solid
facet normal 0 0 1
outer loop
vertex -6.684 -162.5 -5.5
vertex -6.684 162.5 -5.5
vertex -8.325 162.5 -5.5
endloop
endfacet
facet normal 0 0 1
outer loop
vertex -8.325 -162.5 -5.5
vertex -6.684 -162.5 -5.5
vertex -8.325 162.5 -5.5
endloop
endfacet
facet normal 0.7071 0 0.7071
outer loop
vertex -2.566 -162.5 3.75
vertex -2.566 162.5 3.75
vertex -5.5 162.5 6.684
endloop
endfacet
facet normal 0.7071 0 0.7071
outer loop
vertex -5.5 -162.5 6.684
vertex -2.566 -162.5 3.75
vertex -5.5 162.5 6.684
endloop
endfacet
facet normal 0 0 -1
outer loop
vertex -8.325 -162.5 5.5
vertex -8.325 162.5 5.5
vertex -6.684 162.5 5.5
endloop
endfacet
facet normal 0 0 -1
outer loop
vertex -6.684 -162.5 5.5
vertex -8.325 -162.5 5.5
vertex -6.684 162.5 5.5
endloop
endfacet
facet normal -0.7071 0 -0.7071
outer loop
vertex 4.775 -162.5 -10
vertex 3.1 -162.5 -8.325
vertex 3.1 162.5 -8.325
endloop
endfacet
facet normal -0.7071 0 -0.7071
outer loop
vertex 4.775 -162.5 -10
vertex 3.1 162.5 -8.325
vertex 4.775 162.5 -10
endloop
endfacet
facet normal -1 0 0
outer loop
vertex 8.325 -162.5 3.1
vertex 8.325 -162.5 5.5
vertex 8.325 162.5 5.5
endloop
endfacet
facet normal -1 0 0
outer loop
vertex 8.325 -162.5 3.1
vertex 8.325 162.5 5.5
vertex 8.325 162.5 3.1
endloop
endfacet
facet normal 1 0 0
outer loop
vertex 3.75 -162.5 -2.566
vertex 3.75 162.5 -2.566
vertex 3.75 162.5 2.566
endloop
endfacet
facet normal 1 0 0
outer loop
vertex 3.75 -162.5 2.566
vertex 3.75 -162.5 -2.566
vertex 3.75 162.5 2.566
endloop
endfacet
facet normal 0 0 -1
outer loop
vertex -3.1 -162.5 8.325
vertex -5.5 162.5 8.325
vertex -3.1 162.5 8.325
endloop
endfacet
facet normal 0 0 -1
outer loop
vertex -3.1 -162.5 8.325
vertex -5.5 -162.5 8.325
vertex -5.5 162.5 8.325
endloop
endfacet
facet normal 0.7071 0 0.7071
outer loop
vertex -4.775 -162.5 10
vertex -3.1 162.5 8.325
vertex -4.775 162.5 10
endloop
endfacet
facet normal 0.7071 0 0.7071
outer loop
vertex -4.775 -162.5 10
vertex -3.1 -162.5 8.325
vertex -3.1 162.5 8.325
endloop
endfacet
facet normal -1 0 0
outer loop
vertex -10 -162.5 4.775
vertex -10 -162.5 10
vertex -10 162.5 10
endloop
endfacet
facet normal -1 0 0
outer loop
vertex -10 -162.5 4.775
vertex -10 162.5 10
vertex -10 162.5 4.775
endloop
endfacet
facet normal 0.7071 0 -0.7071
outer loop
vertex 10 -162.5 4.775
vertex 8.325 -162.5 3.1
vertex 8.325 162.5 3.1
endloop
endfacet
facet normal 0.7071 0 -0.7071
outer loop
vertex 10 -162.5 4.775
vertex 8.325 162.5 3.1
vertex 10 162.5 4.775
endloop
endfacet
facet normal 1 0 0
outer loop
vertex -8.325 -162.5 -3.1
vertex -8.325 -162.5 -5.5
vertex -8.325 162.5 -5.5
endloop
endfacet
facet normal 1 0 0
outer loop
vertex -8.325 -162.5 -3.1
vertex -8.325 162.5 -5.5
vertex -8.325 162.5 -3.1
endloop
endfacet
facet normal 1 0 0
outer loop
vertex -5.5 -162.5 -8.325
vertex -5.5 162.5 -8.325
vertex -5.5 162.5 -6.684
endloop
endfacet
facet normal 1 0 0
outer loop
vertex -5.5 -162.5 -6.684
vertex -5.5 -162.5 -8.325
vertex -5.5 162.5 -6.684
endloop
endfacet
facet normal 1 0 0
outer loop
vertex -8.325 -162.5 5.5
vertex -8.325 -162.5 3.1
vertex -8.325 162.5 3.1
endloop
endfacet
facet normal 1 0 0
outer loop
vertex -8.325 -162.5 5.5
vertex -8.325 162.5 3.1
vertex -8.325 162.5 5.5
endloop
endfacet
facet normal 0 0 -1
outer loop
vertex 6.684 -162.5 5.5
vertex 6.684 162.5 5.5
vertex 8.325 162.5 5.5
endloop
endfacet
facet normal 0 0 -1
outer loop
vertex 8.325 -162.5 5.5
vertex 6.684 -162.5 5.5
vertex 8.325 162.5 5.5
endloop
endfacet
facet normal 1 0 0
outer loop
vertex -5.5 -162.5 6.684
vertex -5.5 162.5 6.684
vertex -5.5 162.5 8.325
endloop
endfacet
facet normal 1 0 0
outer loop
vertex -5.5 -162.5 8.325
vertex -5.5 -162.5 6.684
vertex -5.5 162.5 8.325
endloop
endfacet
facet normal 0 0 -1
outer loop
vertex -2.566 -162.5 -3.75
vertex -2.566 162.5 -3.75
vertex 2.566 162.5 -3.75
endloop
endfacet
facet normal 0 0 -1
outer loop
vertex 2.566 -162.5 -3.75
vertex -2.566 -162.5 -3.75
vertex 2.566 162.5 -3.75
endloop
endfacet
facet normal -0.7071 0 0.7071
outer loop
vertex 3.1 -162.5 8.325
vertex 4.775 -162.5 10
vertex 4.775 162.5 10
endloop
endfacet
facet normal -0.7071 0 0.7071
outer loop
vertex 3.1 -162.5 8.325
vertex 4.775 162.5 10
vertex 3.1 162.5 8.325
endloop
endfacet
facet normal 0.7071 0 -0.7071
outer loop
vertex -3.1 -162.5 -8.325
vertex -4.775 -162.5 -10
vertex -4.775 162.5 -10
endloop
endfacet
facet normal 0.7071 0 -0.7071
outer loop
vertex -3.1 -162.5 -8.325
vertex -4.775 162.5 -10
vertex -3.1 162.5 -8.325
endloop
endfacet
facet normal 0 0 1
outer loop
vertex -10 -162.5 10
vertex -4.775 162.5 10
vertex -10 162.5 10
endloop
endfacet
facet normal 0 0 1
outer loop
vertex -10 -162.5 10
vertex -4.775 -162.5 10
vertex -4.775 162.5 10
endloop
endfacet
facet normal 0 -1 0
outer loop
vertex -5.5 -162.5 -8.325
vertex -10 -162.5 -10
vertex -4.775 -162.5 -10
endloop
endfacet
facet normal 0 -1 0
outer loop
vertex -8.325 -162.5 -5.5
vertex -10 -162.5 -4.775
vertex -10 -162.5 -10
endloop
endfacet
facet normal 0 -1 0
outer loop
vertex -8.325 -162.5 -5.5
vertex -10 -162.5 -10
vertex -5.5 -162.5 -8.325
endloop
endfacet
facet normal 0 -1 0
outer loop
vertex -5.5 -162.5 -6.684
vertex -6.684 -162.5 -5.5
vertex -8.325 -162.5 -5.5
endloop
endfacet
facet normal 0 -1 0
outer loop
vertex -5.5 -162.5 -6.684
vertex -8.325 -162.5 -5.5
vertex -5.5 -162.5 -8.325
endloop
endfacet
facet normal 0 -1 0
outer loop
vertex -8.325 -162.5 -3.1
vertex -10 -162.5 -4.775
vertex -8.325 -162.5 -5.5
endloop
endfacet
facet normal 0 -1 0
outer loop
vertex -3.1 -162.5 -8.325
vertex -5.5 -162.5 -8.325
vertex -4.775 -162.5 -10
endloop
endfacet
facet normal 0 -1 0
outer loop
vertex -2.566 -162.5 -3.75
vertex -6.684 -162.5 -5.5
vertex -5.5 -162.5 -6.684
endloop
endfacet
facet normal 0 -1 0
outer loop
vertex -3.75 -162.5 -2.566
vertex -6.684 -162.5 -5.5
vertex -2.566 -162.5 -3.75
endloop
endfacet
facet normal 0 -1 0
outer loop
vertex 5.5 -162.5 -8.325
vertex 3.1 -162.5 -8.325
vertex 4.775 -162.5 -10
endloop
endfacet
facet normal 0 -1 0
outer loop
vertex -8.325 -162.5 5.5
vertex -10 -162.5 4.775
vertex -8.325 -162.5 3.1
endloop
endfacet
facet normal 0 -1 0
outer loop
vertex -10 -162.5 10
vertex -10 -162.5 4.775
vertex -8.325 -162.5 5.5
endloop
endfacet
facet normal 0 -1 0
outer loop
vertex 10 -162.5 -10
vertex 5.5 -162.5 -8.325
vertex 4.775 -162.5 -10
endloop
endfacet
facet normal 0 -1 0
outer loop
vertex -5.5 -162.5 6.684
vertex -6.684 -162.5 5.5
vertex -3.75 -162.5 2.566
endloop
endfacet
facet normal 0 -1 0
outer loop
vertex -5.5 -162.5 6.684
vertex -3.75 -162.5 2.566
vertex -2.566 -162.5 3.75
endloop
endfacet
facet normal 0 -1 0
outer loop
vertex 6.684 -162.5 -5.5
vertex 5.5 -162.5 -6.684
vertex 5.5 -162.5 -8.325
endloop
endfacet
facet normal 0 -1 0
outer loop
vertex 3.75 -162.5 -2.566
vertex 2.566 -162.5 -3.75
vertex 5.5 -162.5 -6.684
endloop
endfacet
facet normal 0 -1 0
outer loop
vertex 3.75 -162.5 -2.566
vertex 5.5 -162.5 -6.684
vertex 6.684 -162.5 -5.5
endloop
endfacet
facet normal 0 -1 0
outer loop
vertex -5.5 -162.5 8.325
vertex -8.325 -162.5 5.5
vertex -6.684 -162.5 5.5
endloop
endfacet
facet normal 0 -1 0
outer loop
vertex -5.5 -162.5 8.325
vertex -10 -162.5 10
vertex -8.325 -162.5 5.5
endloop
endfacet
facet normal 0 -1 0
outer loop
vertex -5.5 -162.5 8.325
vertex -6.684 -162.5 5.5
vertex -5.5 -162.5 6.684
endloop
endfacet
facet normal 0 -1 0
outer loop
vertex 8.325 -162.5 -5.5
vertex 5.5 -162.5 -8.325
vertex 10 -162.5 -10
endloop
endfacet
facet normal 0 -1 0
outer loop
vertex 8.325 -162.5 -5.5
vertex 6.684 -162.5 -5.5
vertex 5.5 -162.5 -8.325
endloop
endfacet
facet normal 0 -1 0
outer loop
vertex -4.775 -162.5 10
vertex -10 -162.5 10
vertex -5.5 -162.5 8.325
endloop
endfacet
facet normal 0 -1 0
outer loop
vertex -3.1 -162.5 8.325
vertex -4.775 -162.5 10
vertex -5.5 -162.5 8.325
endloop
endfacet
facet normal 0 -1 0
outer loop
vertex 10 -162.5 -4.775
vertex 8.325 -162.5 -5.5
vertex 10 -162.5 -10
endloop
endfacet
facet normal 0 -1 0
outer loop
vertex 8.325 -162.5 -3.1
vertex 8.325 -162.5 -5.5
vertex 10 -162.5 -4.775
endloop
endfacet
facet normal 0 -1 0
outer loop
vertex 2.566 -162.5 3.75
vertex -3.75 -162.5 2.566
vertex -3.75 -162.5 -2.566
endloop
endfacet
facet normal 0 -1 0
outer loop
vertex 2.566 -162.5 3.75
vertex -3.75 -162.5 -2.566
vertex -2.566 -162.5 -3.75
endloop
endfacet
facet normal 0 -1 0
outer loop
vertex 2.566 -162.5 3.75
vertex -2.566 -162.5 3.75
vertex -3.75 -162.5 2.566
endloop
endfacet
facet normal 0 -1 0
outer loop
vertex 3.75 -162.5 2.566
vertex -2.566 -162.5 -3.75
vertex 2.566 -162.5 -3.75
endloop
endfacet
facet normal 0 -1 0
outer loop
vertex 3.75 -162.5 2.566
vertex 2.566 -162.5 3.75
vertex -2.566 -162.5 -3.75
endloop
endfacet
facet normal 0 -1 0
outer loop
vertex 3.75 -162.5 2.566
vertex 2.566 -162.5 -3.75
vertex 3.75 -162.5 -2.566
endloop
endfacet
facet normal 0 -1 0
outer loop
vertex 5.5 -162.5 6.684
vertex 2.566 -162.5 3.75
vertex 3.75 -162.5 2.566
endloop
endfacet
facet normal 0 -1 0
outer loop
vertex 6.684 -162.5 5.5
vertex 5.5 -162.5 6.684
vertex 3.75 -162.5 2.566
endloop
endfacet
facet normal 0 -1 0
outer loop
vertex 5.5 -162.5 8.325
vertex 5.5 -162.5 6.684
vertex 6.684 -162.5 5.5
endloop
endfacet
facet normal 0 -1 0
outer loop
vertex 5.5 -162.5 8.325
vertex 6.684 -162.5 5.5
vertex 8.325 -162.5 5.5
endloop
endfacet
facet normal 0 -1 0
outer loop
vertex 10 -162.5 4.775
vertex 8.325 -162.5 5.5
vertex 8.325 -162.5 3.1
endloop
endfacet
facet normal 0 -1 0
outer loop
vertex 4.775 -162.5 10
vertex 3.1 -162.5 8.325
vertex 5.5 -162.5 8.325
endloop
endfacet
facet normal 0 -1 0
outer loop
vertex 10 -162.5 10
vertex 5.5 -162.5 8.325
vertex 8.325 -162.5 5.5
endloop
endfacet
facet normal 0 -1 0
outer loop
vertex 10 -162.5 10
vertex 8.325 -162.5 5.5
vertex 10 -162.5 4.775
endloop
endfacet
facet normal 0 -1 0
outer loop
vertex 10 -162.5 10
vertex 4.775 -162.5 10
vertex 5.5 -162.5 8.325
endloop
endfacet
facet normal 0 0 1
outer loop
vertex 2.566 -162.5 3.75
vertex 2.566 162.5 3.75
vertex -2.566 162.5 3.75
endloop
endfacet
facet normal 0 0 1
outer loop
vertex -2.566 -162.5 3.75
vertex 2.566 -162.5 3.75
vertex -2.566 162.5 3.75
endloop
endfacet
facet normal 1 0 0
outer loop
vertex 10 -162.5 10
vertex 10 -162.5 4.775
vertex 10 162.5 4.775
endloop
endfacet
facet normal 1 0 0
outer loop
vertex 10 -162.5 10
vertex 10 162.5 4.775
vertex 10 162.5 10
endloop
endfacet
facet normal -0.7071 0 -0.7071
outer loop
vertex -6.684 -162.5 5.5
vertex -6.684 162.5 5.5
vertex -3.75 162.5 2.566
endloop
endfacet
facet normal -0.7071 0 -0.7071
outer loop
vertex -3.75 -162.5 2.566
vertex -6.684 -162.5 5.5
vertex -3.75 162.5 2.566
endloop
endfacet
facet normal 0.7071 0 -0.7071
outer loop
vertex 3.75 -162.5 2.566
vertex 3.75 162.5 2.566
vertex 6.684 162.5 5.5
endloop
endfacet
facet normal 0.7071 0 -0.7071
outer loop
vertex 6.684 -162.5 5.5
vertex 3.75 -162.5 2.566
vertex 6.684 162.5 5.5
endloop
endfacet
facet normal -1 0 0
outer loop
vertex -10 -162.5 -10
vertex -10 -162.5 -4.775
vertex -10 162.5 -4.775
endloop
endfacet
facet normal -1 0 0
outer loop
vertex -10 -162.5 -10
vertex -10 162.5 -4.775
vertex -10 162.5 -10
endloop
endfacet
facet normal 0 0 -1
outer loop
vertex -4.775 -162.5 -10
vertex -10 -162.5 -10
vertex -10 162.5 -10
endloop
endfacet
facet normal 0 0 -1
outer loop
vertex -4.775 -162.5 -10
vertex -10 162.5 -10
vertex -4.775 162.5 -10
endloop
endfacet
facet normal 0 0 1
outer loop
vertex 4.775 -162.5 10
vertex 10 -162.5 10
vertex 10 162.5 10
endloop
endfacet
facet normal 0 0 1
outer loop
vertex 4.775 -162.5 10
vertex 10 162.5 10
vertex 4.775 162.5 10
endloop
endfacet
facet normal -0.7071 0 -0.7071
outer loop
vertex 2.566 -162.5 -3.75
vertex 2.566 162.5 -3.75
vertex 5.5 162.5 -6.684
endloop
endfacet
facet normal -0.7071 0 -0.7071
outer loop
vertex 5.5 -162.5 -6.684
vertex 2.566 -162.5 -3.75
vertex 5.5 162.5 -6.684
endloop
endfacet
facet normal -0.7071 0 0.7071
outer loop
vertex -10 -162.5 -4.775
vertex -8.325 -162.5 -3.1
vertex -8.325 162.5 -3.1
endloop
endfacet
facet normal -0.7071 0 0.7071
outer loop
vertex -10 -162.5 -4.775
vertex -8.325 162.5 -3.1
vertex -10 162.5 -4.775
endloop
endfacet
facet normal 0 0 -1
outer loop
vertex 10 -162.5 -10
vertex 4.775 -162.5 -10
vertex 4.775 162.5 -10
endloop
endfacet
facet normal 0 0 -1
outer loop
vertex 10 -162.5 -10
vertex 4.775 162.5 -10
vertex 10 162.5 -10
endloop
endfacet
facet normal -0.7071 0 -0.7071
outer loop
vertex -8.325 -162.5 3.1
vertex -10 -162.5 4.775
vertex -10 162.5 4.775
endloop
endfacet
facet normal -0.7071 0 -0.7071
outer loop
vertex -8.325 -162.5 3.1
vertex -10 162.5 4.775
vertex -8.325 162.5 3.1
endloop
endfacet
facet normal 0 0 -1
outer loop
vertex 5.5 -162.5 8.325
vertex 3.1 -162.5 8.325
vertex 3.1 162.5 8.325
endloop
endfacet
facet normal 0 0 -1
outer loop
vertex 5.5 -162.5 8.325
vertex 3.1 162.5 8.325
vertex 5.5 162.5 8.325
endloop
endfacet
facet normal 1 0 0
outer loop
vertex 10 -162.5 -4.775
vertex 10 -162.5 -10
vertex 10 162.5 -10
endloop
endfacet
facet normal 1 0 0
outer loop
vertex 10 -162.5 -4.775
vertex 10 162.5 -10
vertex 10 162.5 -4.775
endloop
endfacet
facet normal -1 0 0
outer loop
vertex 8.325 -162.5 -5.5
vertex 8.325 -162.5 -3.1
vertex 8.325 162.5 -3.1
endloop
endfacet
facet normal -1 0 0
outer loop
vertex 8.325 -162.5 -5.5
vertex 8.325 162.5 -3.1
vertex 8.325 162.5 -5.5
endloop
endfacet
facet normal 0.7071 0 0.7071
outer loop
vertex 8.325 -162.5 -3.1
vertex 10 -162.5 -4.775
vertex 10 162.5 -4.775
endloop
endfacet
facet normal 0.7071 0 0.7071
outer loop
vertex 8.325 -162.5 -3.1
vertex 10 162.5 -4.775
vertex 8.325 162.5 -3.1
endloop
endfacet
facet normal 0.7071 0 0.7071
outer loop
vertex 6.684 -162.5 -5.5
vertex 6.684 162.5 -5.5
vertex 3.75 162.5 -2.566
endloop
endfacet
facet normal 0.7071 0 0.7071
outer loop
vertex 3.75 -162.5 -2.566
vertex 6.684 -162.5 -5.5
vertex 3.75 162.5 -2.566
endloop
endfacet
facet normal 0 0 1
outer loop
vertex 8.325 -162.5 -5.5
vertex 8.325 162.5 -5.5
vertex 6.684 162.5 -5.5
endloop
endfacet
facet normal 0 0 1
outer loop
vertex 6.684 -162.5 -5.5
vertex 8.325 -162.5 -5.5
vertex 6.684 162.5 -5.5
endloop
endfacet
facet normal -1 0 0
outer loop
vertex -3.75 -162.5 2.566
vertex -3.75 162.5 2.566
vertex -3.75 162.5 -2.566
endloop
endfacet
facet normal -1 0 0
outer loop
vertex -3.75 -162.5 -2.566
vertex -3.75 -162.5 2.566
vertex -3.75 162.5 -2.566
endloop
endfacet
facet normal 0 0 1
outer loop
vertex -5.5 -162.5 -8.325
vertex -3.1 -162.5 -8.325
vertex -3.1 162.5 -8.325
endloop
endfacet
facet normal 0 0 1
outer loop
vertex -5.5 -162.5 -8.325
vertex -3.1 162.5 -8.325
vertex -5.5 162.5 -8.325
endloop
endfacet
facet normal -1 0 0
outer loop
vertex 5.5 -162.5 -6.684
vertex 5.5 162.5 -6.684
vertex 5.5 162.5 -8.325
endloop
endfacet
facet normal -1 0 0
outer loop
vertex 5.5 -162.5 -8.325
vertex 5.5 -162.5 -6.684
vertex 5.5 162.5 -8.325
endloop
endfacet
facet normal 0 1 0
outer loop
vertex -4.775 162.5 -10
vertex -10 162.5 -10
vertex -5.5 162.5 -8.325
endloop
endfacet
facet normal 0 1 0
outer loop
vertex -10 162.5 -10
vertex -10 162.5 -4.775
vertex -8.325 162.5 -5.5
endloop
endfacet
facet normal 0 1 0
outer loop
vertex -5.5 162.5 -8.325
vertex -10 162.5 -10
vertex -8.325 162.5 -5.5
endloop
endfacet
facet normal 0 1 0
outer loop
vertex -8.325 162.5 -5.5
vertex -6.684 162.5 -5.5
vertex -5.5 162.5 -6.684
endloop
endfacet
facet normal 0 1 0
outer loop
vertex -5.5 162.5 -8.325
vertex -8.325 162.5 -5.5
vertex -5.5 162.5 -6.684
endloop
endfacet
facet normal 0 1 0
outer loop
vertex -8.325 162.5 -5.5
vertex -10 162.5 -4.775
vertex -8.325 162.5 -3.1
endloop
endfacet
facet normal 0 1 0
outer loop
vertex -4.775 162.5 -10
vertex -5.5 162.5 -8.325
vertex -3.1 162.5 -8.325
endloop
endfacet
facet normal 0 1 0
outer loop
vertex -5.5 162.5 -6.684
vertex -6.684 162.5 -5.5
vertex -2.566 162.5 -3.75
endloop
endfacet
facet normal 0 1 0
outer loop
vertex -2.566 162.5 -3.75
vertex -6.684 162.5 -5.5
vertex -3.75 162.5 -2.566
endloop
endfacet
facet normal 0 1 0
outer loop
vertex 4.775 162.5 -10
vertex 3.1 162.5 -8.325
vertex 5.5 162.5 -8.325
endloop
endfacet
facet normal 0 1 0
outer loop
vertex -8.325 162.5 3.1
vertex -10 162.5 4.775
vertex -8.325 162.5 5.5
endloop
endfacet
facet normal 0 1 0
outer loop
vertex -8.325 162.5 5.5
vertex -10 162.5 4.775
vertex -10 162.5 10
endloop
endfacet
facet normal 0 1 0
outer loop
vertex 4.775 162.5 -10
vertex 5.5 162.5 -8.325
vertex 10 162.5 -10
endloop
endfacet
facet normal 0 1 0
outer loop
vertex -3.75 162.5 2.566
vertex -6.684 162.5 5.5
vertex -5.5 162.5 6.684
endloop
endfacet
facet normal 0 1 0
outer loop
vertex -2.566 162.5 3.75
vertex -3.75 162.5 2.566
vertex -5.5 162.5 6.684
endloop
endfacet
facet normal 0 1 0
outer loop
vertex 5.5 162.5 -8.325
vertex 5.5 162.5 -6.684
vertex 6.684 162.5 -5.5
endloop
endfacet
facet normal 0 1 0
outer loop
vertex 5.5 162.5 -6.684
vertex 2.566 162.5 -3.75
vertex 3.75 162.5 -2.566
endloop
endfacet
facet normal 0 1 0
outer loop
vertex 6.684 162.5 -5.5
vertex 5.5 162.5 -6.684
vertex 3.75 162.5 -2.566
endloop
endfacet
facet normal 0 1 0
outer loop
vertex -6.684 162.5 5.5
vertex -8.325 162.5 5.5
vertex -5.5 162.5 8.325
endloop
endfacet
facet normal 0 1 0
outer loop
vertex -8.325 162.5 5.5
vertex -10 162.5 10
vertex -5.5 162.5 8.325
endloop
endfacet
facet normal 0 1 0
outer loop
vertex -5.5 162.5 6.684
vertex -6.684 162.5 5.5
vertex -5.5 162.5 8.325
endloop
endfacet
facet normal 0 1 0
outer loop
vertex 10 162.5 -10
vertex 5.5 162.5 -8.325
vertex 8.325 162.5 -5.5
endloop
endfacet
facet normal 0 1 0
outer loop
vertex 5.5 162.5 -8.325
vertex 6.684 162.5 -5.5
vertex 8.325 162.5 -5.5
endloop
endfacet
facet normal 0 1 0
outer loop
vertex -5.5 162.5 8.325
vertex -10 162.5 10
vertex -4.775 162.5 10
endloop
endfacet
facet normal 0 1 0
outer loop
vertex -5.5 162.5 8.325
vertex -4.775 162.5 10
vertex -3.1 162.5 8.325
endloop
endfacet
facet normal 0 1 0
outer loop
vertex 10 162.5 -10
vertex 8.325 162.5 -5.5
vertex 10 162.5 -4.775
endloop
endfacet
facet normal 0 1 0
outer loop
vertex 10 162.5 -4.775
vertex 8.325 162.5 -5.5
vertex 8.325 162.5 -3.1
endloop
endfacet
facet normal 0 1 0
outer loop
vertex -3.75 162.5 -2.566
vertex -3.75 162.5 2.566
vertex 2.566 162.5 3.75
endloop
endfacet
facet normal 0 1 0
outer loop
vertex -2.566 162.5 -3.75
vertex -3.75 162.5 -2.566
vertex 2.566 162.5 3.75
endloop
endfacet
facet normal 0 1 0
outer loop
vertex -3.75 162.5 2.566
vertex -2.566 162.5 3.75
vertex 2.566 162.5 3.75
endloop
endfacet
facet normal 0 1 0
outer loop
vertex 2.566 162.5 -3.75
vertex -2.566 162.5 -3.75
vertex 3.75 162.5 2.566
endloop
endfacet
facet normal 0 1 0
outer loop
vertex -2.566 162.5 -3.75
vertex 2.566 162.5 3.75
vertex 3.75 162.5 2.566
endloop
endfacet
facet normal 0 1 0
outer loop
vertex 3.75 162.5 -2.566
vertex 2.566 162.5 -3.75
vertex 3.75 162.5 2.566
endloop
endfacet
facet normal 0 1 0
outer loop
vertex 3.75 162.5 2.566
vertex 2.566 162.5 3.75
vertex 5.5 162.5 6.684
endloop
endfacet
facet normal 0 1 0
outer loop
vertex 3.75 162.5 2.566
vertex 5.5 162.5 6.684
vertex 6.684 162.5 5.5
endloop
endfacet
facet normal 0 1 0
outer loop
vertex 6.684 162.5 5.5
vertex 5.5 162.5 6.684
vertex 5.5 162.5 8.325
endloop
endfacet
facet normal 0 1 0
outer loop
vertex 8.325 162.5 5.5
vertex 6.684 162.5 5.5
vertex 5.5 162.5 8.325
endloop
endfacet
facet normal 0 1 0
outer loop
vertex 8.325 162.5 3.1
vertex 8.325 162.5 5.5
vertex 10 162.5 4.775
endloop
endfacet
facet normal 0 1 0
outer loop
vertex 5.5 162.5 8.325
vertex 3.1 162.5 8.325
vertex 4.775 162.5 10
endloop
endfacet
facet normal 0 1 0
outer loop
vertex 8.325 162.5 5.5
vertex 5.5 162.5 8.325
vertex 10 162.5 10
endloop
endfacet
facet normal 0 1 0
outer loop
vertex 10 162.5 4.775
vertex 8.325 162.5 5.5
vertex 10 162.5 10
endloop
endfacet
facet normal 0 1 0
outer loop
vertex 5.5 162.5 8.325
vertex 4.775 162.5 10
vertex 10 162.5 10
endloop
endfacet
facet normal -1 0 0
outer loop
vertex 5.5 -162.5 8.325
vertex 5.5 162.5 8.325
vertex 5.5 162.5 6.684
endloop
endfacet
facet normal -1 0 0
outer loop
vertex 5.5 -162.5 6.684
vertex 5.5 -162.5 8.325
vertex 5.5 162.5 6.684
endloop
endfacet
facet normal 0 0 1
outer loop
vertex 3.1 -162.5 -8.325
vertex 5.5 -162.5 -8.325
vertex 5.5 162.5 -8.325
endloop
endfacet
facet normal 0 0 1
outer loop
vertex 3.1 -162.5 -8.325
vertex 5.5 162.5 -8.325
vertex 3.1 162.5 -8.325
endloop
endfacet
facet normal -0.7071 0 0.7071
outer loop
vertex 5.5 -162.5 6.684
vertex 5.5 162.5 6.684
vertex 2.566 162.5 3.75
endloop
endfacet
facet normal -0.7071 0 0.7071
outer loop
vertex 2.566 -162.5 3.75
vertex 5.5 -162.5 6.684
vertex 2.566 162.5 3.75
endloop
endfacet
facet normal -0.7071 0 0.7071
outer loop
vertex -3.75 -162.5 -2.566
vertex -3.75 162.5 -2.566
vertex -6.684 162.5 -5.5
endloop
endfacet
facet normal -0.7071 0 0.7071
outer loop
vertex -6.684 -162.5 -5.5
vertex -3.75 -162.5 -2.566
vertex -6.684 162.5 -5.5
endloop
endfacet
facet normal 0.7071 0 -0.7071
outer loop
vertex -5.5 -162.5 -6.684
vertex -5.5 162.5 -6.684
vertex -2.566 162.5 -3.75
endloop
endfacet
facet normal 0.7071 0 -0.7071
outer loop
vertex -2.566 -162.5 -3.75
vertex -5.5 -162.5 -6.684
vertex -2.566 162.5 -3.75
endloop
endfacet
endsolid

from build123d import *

# Parameters (mm, degrees)
F1_DEPTH = 162.5


with BuildPart() as f1:
    # F0 (on Front) → F1 (new body, symmetric)
    with BuildSketch(Plane.XZ):
        Polygon((-4.775, 10), (-10, 10), (-10, 4.775), (-8.325, 3.1), (-8.325, 5.5), (-6.6844038585, 5.5), (-3.75, 2.5655961415), (-3.75, 0), (-3.75, -2.5655961415), (-6.6844038585, -5.5), (-8.325, -5.5), (-8.325, -3.1), (-10, -4.775), (-10, -10), (-4.775, -10), (-3.1, -8.325), (-5.5, -8.325), (-5.5, -6.6844038585), (-2.5655961415, -3.75), (0, -3.75), (2.5655961415, -3.75), (5.5, -6.6844038585), (5.5, -8.325), (3.1, -8.325), (4.775, -10), (10, -10), (10, -4.775), (8.325, -3.1), (8.325, -5.5), (6.6844038585, -5.5), (3.75, -2.5655961415), (3.75, 0), (3.75, 2.5655961415), (6.6844038585, 5.5), (8.325, 5.5), (8.325, 3.1), (10, 4.775), (10, 10), (4.775, 10), (3.1, 8.325), (5.5, 8.325), (5.5, 6.6844038585), (2.5655961415, 3.75), (0, 3.75), (-2.5655961415, 3.75), (-5.5, 6.6844038585), (-5.5, 8.325), (-3.1, 8.325), align=None)
    extrude(amount=F1_DEPTH, both=True)


solid = f1.part
